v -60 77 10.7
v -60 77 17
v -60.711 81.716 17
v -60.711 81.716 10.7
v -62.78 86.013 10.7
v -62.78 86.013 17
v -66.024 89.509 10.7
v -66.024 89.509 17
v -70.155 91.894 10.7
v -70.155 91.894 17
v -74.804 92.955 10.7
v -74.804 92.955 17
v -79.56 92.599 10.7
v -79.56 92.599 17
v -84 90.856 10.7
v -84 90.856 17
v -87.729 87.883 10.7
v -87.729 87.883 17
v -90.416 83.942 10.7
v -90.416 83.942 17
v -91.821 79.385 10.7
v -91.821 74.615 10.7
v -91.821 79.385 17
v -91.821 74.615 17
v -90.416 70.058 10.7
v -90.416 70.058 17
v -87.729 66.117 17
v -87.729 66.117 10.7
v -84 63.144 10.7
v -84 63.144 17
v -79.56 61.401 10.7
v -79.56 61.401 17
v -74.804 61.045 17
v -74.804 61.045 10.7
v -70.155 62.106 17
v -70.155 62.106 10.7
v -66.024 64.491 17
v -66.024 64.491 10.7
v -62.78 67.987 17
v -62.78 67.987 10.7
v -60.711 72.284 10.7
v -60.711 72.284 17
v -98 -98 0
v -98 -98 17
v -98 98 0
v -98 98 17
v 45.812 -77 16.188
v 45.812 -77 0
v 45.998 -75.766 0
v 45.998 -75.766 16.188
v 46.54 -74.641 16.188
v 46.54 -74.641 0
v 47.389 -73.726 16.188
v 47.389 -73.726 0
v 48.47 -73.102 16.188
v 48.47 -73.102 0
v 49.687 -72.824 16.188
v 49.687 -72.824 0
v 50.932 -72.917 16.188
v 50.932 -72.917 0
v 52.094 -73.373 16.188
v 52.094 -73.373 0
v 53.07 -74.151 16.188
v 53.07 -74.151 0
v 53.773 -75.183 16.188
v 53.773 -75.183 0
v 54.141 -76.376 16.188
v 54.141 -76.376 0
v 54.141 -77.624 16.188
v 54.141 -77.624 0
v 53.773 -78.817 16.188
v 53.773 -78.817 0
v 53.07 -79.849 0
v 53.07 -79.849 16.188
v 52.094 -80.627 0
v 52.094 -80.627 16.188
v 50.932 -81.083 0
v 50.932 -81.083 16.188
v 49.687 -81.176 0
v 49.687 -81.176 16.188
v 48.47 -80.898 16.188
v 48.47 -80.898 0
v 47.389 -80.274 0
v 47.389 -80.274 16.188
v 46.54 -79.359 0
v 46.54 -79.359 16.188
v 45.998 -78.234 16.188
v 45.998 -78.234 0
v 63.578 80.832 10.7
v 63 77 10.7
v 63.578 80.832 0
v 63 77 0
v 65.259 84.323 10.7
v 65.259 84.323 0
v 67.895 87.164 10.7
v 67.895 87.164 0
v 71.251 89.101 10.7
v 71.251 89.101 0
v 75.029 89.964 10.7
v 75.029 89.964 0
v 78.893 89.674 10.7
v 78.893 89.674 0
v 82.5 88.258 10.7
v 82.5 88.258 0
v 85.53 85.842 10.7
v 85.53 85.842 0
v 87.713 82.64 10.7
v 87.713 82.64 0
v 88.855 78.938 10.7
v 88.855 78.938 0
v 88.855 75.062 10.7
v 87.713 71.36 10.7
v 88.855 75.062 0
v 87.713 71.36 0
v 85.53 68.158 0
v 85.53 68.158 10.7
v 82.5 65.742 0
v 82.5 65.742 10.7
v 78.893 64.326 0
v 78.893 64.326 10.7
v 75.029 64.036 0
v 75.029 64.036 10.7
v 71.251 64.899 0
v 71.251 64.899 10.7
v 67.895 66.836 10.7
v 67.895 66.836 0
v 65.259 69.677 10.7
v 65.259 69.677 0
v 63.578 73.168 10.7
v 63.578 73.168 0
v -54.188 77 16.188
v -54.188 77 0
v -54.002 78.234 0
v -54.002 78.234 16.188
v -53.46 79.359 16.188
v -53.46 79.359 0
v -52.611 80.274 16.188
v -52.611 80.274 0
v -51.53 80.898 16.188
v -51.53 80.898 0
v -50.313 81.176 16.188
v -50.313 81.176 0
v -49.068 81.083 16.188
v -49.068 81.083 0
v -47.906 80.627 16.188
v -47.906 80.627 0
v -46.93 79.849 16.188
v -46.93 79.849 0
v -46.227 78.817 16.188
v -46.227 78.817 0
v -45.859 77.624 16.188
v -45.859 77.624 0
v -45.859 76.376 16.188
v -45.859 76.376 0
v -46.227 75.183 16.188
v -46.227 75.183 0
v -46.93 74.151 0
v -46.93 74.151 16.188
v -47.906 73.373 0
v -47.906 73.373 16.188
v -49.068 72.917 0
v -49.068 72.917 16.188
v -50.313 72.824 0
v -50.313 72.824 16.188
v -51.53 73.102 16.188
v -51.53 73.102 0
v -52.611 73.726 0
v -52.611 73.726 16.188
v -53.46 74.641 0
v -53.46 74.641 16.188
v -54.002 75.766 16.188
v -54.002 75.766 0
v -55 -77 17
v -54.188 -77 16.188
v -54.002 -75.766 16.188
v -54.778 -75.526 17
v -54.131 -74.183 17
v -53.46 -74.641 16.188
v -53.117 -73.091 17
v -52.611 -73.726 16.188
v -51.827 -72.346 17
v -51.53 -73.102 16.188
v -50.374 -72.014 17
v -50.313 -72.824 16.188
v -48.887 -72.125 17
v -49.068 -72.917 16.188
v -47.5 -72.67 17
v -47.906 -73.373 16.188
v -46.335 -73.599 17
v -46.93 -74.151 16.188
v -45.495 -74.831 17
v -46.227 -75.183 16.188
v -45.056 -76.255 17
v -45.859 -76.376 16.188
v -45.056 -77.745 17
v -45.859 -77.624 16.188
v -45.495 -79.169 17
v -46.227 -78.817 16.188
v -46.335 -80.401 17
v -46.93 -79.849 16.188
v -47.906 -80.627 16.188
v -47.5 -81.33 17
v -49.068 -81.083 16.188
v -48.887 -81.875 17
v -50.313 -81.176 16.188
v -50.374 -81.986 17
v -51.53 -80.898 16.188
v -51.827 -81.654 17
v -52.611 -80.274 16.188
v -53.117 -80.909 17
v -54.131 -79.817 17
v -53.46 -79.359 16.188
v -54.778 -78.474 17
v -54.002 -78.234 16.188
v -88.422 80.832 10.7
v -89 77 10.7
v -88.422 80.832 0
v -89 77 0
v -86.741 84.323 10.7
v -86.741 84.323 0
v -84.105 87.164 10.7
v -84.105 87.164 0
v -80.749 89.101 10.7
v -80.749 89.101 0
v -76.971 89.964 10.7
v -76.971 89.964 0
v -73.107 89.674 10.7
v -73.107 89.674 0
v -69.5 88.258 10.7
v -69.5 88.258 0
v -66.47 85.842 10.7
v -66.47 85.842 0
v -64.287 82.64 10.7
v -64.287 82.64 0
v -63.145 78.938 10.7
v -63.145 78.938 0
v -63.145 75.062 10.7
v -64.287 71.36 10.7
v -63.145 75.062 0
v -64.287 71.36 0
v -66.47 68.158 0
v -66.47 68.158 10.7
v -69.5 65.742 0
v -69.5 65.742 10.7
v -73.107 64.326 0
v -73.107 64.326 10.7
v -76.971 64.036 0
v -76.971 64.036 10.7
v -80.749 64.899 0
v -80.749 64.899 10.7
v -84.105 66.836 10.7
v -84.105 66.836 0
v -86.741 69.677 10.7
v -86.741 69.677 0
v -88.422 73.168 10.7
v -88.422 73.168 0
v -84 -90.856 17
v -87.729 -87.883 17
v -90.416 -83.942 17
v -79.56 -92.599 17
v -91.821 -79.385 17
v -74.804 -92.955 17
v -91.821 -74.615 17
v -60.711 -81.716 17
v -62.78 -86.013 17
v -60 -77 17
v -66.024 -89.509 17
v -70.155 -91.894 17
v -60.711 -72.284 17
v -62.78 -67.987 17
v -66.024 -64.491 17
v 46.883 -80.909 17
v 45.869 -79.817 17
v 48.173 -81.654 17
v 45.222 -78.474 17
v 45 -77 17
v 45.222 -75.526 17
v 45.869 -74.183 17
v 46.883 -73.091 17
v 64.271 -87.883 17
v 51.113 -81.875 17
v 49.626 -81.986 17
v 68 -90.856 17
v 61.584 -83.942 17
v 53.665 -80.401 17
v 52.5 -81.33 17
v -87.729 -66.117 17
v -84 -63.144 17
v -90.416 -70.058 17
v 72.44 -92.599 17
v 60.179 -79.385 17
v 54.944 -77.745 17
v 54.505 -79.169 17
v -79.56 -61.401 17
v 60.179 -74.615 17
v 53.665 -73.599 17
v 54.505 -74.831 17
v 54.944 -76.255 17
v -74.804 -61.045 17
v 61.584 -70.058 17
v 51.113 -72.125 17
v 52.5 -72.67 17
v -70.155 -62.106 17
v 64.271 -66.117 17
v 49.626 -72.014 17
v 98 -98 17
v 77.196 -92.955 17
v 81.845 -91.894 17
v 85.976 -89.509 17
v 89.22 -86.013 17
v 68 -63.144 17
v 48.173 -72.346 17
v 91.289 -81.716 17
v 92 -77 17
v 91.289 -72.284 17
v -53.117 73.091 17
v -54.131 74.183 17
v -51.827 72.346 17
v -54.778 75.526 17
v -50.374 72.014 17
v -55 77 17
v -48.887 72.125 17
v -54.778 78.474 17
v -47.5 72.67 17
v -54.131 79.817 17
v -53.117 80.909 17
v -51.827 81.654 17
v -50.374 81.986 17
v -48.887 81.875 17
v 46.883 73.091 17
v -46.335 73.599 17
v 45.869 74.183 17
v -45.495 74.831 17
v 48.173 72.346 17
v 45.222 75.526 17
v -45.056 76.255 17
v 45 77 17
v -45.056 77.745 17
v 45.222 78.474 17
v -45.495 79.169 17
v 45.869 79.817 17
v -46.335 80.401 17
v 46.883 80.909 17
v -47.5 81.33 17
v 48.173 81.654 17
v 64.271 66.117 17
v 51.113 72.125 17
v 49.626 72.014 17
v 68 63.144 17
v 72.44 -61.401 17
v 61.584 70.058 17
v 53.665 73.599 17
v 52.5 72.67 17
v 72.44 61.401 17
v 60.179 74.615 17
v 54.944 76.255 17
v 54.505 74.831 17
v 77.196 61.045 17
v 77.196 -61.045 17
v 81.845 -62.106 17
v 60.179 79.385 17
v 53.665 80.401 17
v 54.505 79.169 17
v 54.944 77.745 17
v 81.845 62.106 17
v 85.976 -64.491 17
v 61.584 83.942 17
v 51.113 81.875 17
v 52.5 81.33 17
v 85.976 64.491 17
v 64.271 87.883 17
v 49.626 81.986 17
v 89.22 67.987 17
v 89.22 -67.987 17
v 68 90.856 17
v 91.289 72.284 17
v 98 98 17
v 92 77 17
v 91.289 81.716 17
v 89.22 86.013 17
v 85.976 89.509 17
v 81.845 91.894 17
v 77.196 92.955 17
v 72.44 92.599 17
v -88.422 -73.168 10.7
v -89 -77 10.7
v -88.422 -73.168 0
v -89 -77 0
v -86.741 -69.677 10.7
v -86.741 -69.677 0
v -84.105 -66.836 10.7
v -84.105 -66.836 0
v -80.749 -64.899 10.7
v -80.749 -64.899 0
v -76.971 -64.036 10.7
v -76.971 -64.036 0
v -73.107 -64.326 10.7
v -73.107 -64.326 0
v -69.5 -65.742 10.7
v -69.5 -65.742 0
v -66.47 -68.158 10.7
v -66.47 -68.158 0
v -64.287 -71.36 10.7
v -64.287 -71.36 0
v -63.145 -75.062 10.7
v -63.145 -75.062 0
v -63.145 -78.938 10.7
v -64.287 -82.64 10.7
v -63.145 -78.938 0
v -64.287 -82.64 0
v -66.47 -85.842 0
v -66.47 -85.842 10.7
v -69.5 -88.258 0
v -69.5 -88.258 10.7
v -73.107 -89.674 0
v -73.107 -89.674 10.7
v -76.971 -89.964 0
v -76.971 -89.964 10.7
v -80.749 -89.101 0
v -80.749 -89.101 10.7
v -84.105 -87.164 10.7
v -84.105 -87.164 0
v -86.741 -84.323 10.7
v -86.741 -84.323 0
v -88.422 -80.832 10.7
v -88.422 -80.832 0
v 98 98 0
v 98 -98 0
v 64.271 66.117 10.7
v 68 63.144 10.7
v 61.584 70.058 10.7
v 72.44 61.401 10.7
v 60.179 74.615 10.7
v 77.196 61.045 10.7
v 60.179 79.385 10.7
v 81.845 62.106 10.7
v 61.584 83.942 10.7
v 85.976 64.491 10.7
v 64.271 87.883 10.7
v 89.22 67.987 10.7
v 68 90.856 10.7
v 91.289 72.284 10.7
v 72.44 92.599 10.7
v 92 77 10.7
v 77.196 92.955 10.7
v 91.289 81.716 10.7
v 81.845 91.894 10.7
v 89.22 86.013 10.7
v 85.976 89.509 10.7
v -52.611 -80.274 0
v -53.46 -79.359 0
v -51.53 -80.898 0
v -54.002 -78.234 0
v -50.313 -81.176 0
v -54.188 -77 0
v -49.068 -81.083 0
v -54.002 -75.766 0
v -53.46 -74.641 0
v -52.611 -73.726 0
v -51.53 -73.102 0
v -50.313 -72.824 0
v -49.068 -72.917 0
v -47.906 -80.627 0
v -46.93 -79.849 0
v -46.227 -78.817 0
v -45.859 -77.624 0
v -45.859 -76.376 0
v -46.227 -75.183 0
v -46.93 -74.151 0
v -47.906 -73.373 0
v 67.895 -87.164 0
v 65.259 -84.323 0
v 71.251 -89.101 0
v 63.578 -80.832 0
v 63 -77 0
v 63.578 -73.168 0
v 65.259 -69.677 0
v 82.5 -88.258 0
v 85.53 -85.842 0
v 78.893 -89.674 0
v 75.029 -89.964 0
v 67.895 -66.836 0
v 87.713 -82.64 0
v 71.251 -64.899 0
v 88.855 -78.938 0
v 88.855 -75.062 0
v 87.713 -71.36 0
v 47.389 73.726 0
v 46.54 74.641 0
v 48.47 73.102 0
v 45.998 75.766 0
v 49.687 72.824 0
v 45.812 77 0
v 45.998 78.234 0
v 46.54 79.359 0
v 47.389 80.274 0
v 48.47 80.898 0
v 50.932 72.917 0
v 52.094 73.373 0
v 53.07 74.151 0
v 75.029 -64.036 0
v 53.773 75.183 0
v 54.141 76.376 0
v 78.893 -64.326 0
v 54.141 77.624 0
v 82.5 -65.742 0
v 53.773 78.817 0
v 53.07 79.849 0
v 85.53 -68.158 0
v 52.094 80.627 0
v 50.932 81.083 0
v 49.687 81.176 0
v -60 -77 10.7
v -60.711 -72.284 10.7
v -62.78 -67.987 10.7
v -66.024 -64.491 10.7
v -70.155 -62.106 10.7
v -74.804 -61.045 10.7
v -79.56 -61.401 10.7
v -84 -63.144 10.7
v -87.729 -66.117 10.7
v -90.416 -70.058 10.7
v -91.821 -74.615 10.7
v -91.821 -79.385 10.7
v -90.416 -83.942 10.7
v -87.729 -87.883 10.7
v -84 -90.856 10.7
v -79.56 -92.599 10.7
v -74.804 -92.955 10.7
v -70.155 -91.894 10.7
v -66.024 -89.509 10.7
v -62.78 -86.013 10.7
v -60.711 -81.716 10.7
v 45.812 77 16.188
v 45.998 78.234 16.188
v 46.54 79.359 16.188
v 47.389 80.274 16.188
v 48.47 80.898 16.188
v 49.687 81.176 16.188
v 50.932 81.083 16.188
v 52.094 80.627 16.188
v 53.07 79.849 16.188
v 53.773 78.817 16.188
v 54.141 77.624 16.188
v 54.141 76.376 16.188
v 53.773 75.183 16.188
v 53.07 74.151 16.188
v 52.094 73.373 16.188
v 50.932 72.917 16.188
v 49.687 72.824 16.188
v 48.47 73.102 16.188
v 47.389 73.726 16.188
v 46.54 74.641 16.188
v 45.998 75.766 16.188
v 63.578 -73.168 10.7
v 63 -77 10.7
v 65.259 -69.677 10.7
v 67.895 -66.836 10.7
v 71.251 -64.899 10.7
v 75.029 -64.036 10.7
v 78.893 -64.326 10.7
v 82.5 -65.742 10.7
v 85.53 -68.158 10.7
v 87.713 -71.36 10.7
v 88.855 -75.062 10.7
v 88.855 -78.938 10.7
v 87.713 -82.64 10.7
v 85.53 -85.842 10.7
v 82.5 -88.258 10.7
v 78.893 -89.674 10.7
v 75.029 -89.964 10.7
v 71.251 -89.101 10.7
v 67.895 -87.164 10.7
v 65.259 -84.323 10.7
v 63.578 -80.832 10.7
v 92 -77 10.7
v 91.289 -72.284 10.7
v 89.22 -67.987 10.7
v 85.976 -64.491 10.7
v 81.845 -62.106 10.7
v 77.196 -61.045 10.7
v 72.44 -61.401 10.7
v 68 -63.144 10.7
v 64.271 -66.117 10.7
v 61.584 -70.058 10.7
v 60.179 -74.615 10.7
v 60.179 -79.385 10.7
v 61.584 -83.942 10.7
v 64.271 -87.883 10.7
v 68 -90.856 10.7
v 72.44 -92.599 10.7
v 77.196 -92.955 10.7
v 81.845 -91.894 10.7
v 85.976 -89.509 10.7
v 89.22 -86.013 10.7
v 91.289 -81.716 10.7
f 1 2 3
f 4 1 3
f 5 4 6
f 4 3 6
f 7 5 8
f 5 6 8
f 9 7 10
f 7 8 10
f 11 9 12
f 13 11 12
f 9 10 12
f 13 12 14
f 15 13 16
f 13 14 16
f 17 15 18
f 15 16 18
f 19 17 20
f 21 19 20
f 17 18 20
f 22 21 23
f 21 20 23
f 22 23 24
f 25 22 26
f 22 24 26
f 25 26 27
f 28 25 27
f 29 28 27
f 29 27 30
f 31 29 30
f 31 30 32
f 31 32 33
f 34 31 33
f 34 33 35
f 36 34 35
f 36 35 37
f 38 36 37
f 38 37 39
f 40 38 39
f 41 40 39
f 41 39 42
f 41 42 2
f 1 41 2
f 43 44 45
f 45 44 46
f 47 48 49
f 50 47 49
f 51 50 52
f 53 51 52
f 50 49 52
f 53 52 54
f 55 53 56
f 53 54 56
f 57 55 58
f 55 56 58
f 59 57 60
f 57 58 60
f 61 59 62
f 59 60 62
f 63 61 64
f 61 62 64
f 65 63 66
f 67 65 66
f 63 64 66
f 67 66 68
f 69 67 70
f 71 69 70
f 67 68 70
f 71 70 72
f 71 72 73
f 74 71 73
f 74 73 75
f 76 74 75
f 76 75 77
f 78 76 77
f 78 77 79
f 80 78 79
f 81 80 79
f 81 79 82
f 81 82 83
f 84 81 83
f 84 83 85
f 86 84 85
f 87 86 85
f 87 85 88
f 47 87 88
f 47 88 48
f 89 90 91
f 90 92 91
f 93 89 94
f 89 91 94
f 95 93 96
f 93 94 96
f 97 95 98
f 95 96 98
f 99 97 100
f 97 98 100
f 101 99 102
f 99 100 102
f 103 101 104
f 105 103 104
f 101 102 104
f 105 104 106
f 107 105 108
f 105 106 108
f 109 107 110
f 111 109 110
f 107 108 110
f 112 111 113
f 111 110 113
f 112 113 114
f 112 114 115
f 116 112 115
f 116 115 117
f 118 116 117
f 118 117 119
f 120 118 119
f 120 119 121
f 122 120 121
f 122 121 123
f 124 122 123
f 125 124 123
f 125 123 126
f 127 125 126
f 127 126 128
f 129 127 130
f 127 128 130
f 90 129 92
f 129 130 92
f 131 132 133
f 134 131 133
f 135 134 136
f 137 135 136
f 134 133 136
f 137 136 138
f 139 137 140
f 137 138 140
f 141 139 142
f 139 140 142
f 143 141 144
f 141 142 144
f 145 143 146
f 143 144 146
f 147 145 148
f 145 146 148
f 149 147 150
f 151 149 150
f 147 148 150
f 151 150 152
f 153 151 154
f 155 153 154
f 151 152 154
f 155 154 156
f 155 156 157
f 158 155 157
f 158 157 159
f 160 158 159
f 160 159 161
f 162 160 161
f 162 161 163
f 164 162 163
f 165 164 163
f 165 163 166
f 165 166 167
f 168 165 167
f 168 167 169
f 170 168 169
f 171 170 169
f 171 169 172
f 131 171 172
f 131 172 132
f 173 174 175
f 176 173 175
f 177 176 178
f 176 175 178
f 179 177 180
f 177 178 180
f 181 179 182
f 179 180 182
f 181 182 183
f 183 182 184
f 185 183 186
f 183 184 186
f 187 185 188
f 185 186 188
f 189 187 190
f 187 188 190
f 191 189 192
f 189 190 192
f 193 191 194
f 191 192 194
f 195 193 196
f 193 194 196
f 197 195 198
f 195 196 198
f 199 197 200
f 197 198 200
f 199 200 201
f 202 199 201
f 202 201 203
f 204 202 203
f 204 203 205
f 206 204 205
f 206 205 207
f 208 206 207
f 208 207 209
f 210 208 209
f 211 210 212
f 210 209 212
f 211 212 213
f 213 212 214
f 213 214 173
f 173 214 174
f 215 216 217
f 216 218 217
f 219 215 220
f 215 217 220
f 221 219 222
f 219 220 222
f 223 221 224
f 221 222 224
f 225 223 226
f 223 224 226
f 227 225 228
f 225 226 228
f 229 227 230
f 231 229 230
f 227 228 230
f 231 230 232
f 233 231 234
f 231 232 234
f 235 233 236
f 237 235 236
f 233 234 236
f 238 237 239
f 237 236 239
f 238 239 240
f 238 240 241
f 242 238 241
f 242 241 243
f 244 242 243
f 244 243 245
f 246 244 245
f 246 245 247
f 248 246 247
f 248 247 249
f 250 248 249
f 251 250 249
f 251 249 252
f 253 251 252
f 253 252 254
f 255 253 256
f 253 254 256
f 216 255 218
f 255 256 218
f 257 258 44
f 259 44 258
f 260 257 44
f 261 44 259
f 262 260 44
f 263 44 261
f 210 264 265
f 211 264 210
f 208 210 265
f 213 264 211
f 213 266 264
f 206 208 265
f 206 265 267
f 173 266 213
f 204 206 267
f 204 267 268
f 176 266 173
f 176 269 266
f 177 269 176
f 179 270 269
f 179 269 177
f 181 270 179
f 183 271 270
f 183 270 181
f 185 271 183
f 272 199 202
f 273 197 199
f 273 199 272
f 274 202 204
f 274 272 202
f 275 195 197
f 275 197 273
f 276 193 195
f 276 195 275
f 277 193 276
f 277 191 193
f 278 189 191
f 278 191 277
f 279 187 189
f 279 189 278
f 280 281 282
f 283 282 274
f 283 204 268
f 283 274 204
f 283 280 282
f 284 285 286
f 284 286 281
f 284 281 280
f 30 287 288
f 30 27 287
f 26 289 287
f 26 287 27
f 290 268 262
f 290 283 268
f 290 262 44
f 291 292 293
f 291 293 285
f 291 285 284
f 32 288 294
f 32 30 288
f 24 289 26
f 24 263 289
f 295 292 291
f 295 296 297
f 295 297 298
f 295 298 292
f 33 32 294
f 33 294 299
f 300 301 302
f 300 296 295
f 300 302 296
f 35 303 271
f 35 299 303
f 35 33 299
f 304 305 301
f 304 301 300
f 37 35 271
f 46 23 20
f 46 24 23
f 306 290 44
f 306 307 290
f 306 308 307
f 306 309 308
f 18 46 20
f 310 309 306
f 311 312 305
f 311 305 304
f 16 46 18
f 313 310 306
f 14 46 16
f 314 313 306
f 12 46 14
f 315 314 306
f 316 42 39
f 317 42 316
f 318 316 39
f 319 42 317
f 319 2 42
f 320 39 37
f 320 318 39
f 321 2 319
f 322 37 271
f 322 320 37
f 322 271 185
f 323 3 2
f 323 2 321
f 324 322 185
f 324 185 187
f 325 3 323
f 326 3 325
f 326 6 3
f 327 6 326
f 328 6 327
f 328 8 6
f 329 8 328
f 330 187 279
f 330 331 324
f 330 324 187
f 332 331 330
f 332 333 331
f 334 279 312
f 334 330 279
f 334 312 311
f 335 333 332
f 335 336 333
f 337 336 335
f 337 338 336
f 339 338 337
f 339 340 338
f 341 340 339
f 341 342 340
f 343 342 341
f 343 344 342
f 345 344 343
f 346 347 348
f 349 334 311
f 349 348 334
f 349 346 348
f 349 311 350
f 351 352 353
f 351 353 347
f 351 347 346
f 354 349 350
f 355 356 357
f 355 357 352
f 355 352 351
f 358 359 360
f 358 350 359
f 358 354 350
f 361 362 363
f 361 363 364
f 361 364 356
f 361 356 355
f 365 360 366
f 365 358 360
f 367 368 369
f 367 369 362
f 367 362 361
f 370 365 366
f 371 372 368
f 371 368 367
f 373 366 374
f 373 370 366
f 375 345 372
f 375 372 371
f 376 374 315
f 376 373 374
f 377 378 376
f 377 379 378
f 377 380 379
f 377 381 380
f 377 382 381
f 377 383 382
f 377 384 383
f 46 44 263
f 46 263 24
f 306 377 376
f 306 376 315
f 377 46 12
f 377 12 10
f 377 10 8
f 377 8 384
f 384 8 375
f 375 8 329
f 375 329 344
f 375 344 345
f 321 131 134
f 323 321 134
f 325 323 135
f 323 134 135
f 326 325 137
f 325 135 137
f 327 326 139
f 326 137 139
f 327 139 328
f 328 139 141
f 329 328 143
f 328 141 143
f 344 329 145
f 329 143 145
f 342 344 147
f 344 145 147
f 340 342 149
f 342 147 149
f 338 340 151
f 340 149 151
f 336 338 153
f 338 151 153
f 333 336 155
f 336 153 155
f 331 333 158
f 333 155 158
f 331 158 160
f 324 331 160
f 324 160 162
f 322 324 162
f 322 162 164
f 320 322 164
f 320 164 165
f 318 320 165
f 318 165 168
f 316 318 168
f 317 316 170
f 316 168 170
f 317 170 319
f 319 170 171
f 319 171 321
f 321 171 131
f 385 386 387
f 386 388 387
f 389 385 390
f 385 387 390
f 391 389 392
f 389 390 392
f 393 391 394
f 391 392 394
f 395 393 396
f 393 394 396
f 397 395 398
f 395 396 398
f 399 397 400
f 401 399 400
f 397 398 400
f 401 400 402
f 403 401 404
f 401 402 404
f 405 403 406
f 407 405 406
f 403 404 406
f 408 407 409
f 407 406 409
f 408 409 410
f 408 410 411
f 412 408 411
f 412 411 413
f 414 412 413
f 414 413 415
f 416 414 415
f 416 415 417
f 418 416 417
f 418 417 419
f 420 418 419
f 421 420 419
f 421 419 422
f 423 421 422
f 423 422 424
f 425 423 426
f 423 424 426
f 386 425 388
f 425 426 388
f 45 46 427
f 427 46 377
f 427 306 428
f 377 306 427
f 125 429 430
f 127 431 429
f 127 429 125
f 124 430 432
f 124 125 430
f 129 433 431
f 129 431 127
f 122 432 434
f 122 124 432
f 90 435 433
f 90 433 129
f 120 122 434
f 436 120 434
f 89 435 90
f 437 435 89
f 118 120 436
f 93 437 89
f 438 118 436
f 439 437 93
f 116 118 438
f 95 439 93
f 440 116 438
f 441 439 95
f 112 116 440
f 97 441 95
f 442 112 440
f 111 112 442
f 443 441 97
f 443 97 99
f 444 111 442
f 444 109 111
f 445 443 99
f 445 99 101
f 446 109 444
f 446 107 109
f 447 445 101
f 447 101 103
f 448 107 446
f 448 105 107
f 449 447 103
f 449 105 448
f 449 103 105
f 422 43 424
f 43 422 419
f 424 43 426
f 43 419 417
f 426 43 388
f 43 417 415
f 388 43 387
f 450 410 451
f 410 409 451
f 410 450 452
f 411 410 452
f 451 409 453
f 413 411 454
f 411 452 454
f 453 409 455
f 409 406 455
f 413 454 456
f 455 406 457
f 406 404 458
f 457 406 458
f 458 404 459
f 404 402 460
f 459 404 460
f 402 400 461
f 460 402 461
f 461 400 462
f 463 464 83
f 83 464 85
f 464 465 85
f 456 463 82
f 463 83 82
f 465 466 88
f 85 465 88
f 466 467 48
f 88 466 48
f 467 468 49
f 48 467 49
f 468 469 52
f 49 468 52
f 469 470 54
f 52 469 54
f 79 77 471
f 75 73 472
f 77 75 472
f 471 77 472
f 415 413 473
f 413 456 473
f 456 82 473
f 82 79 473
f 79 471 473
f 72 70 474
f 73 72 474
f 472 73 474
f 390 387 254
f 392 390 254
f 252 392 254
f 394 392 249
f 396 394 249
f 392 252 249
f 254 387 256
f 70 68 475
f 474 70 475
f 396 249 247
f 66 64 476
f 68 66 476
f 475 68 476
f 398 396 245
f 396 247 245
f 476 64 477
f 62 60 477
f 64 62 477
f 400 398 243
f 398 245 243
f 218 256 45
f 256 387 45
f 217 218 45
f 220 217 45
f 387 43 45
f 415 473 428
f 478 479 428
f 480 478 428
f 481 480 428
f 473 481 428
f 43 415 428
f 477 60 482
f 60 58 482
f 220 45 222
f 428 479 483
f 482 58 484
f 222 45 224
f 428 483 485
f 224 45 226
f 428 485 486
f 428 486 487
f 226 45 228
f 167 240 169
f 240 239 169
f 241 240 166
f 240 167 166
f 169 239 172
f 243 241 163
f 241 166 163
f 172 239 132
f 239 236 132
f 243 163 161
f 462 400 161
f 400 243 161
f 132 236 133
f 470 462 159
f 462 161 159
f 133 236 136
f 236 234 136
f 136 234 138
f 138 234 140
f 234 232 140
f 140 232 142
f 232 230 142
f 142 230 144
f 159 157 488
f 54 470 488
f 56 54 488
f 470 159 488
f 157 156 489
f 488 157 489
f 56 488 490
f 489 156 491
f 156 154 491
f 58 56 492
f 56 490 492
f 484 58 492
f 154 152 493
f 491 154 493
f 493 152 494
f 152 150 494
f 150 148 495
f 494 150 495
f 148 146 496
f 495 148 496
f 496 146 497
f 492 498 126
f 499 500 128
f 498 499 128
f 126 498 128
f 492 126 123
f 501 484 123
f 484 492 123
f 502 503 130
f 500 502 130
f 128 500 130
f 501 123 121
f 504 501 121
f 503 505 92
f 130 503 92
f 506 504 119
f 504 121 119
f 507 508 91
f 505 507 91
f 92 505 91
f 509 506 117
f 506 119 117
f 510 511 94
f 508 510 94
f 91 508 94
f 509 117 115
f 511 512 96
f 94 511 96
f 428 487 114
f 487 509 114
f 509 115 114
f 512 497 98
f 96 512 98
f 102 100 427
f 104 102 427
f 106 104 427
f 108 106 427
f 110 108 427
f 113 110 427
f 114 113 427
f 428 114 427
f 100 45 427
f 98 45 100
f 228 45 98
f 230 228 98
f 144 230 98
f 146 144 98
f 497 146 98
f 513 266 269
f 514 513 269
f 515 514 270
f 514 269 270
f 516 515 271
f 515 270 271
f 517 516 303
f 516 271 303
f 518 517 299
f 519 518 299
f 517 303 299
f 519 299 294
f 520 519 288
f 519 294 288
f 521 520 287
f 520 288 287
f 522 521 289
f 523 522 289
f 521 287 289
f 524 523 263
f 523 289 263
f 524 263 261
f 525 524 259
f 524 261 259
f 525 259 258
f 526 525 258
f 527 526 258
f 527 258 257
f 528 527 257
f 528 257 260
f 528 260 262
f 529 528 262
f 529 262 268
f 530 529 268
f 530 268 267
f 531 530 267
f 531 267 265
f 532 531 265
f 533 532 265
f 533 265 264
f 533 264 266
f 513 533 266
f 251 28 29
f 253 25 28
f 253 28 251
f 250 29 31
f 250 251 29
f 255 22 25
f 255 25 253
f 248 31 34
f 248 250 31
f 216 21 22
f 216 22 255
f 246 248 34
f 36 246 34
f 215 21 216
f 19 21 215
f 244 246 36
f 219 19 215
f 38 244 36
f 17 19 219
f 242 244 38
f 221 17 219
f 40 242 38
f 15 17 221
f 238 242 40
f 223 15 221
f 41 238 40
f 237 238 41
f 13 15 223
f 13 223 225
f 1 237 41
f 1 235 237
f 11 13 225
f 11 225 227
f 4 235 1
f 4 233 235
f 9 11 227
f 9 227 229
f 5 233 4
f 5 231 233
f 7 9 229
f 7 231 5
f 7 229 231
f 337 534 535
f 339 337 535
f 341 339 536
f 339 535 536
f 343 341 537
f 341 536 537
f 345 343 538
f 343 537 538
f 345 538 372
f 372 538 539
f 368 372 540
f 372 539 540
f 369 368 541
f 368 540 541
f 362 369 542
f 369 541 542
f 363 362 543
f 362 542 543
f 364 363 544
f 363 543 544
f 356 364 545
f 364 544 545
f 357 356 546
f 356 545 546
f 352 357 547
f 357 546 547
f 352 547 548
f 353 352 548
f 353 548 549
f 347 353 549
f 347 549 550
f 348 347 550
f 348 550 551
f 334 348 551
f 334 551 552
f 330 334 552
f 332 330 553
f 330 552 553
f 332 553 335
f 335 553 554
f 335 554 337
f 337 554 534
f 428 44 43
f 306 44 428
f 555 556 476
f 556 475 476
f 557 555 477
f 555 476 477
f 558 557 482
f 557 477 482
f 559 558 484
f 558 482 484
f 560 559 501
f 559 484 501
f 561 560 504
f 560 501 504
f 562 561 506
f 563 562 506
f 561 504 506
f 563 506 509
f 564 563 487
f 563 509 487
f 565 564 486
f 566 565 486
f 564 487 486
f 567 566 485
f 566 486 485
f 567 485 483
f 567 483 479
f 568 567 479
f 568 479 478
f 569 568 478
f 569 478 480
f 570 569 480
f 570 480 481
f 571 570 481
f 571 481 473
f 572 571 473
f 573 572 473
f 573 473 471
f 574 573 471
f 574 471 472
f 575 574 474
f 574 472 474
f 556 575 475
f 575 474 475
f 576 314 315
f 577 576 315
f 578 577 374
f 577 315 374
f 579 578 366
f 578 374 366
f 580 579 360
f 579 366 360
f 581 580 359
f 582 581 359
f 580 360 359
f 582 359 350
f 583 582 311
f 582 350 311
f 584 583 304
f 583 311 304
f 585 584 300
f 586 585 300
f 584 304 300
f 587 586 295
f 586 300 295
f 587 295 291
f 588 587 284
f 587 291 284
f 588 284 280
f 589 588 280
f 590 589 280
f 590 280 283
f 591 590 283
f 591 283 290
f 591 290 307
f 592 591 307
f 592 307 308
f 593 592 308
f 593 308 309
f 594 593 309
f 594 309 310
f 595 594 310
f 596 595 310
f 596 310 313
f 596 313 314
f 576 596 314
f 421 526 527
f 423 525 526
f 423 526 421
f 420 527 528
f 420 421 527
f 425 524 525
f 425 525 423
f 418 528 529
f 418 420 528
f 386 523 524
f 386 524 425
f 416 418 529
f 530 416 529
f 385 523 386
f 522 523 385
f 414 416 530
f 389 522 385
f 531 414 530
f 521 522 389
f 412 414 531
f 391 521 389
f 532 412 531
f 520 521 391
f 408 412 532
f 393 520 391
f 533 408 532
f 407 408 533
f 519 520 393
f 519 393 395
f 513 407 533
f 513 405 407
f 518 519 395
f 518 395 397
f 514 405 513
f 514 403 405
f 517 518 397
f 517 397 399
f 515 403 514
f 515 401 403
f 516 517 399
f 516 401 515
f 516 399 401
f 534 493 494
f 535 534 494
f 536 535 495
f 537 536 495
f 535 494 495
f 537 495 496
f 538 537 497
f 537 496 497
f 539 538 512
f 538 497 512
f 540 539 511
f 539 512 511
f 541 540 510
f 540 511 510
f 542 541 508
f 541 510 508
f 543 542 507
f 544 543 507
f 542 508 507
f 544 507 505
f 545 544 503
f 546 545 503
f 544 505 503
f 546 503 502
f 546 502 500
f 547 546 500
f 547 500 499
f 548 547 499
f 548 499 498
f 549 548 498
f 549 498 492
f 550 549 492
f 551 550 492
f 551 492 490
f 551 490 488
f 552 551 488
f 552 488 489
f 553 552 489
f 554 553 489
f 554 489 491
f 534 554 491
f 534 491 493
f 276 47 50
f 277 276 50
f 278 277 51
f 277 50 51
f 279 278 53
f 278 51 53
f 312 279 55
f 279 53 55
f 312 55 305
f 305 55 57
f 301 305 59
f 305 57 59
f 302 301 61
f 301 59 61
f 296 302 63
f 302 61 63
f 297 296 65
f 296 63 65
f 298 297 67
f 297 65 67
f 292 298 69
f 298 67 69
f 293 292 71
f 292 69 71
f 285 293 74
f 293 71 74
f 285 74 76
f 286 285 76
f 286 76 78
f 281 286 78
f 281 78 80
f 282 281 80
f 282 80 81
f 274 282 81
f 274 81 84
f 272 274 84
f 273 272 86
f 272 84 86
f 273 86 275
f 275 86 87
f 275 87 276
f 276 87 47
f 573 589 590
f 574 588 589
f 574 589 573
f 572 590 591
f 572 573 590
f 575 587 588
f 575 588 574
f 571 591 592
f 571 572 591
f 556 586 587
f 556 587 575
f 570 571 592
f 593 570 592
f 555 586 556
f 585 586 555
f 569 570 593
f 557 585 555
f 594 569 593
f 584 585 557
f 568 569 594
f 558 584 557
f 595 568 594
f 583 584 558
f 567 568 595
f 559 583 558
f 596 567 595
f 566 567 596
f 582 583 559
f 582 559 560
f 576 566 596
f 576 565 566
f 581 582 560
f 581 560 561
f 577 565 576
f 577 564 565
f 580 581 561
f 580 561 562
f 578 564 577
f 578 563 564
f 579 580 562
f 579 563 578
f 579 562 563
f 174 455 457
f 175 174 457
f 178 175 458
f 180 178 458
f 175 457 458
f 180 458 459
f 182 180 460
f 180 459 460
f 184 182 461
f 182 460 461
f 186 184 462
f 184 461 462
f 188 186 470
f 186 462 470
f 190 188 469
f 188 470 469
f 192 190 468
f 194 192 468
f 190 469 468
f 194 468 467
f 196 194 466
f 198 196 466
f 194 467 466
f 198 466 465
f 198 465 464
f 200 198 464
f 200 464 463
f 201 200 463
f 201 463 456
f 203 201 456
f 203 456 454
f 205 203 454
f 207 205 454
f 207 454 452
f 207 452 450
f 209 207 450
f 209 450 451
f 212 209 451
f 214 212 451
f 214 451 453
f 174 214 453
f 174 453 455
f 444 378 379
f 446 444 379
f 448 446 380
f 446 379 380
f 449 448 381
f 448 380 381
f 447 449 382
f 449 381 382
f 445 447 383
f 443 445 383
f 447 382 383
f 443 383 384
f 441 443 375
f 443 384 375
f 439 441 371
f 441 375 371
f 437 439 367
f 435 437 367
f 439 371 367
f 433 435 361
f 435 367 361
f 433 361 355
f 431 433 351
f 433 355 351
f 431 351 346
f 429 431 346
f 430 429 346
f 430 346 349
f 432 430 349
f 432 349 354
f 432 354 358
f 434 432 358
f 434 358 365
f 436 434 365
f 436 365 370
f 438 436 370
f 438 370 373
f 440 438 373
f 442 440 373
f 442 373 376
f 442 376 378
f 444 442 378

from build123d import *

# Parameters (mm, degrees)
SKETCH_1_W                   = 196
SKETCH_1_H                   = 196
EXTRUDE_1_DEPTH              = 17
HOLE_WIZARD_1_D              = 8.376
HOLE_WIZARD_M241_D           = 26
HOLE_WIZARD_M241_CBORE_D     = 32
HOLE_WIZARD_M241_CBORE_DEPTH = 6.3
CHAMFER_1_SIZE               = 0.812


with BuildPart() as part:
    # Эскиз1 → Бобышка-Вытянуть1 (new body)
    with BuildSketch(Plane.XY.offset(17)):
        Rectangle(SKETCH_1_W, SKETCH_1_H)
    extrude(amount=-EXTRUDE_1_DEPTH)

    # Отверстие1 (through all)
    with Locations(Plane.XY.offset(17)):
        with Locations((-50, 77), (-50, -77), (50, 77), (50, -77)):
            Hole(HOLE_WIZARD_1_D / 2)

    # Цековка для  болта с шестигранной головкой M241 (through all)
    with Locations(Plane.XY.offset(17)):
        with Locations((76, -77), (-76, -77), (76, 77), (-76, 77)):
            CounterBoreHole(HOLE_WIZARD_M241_D / 2, HOLE_WIZARD_M241_CBORE_D / 2, HOLE_WIZARD_M241_CBORE_DEPTH)

    # Фаска1
    chamfer_1_edges = [part.edges().sort_by_distance(p)[0] for p in [
        (54.188, -77, 17),
        (54.188, 77, 17),
        (-45.812, -77, 17),
        (-45.812, 77, 17),
    ]]
    chamfer(chamfer_1_edges, length=CHAMFER_1_SIZE)


solid = part.part
